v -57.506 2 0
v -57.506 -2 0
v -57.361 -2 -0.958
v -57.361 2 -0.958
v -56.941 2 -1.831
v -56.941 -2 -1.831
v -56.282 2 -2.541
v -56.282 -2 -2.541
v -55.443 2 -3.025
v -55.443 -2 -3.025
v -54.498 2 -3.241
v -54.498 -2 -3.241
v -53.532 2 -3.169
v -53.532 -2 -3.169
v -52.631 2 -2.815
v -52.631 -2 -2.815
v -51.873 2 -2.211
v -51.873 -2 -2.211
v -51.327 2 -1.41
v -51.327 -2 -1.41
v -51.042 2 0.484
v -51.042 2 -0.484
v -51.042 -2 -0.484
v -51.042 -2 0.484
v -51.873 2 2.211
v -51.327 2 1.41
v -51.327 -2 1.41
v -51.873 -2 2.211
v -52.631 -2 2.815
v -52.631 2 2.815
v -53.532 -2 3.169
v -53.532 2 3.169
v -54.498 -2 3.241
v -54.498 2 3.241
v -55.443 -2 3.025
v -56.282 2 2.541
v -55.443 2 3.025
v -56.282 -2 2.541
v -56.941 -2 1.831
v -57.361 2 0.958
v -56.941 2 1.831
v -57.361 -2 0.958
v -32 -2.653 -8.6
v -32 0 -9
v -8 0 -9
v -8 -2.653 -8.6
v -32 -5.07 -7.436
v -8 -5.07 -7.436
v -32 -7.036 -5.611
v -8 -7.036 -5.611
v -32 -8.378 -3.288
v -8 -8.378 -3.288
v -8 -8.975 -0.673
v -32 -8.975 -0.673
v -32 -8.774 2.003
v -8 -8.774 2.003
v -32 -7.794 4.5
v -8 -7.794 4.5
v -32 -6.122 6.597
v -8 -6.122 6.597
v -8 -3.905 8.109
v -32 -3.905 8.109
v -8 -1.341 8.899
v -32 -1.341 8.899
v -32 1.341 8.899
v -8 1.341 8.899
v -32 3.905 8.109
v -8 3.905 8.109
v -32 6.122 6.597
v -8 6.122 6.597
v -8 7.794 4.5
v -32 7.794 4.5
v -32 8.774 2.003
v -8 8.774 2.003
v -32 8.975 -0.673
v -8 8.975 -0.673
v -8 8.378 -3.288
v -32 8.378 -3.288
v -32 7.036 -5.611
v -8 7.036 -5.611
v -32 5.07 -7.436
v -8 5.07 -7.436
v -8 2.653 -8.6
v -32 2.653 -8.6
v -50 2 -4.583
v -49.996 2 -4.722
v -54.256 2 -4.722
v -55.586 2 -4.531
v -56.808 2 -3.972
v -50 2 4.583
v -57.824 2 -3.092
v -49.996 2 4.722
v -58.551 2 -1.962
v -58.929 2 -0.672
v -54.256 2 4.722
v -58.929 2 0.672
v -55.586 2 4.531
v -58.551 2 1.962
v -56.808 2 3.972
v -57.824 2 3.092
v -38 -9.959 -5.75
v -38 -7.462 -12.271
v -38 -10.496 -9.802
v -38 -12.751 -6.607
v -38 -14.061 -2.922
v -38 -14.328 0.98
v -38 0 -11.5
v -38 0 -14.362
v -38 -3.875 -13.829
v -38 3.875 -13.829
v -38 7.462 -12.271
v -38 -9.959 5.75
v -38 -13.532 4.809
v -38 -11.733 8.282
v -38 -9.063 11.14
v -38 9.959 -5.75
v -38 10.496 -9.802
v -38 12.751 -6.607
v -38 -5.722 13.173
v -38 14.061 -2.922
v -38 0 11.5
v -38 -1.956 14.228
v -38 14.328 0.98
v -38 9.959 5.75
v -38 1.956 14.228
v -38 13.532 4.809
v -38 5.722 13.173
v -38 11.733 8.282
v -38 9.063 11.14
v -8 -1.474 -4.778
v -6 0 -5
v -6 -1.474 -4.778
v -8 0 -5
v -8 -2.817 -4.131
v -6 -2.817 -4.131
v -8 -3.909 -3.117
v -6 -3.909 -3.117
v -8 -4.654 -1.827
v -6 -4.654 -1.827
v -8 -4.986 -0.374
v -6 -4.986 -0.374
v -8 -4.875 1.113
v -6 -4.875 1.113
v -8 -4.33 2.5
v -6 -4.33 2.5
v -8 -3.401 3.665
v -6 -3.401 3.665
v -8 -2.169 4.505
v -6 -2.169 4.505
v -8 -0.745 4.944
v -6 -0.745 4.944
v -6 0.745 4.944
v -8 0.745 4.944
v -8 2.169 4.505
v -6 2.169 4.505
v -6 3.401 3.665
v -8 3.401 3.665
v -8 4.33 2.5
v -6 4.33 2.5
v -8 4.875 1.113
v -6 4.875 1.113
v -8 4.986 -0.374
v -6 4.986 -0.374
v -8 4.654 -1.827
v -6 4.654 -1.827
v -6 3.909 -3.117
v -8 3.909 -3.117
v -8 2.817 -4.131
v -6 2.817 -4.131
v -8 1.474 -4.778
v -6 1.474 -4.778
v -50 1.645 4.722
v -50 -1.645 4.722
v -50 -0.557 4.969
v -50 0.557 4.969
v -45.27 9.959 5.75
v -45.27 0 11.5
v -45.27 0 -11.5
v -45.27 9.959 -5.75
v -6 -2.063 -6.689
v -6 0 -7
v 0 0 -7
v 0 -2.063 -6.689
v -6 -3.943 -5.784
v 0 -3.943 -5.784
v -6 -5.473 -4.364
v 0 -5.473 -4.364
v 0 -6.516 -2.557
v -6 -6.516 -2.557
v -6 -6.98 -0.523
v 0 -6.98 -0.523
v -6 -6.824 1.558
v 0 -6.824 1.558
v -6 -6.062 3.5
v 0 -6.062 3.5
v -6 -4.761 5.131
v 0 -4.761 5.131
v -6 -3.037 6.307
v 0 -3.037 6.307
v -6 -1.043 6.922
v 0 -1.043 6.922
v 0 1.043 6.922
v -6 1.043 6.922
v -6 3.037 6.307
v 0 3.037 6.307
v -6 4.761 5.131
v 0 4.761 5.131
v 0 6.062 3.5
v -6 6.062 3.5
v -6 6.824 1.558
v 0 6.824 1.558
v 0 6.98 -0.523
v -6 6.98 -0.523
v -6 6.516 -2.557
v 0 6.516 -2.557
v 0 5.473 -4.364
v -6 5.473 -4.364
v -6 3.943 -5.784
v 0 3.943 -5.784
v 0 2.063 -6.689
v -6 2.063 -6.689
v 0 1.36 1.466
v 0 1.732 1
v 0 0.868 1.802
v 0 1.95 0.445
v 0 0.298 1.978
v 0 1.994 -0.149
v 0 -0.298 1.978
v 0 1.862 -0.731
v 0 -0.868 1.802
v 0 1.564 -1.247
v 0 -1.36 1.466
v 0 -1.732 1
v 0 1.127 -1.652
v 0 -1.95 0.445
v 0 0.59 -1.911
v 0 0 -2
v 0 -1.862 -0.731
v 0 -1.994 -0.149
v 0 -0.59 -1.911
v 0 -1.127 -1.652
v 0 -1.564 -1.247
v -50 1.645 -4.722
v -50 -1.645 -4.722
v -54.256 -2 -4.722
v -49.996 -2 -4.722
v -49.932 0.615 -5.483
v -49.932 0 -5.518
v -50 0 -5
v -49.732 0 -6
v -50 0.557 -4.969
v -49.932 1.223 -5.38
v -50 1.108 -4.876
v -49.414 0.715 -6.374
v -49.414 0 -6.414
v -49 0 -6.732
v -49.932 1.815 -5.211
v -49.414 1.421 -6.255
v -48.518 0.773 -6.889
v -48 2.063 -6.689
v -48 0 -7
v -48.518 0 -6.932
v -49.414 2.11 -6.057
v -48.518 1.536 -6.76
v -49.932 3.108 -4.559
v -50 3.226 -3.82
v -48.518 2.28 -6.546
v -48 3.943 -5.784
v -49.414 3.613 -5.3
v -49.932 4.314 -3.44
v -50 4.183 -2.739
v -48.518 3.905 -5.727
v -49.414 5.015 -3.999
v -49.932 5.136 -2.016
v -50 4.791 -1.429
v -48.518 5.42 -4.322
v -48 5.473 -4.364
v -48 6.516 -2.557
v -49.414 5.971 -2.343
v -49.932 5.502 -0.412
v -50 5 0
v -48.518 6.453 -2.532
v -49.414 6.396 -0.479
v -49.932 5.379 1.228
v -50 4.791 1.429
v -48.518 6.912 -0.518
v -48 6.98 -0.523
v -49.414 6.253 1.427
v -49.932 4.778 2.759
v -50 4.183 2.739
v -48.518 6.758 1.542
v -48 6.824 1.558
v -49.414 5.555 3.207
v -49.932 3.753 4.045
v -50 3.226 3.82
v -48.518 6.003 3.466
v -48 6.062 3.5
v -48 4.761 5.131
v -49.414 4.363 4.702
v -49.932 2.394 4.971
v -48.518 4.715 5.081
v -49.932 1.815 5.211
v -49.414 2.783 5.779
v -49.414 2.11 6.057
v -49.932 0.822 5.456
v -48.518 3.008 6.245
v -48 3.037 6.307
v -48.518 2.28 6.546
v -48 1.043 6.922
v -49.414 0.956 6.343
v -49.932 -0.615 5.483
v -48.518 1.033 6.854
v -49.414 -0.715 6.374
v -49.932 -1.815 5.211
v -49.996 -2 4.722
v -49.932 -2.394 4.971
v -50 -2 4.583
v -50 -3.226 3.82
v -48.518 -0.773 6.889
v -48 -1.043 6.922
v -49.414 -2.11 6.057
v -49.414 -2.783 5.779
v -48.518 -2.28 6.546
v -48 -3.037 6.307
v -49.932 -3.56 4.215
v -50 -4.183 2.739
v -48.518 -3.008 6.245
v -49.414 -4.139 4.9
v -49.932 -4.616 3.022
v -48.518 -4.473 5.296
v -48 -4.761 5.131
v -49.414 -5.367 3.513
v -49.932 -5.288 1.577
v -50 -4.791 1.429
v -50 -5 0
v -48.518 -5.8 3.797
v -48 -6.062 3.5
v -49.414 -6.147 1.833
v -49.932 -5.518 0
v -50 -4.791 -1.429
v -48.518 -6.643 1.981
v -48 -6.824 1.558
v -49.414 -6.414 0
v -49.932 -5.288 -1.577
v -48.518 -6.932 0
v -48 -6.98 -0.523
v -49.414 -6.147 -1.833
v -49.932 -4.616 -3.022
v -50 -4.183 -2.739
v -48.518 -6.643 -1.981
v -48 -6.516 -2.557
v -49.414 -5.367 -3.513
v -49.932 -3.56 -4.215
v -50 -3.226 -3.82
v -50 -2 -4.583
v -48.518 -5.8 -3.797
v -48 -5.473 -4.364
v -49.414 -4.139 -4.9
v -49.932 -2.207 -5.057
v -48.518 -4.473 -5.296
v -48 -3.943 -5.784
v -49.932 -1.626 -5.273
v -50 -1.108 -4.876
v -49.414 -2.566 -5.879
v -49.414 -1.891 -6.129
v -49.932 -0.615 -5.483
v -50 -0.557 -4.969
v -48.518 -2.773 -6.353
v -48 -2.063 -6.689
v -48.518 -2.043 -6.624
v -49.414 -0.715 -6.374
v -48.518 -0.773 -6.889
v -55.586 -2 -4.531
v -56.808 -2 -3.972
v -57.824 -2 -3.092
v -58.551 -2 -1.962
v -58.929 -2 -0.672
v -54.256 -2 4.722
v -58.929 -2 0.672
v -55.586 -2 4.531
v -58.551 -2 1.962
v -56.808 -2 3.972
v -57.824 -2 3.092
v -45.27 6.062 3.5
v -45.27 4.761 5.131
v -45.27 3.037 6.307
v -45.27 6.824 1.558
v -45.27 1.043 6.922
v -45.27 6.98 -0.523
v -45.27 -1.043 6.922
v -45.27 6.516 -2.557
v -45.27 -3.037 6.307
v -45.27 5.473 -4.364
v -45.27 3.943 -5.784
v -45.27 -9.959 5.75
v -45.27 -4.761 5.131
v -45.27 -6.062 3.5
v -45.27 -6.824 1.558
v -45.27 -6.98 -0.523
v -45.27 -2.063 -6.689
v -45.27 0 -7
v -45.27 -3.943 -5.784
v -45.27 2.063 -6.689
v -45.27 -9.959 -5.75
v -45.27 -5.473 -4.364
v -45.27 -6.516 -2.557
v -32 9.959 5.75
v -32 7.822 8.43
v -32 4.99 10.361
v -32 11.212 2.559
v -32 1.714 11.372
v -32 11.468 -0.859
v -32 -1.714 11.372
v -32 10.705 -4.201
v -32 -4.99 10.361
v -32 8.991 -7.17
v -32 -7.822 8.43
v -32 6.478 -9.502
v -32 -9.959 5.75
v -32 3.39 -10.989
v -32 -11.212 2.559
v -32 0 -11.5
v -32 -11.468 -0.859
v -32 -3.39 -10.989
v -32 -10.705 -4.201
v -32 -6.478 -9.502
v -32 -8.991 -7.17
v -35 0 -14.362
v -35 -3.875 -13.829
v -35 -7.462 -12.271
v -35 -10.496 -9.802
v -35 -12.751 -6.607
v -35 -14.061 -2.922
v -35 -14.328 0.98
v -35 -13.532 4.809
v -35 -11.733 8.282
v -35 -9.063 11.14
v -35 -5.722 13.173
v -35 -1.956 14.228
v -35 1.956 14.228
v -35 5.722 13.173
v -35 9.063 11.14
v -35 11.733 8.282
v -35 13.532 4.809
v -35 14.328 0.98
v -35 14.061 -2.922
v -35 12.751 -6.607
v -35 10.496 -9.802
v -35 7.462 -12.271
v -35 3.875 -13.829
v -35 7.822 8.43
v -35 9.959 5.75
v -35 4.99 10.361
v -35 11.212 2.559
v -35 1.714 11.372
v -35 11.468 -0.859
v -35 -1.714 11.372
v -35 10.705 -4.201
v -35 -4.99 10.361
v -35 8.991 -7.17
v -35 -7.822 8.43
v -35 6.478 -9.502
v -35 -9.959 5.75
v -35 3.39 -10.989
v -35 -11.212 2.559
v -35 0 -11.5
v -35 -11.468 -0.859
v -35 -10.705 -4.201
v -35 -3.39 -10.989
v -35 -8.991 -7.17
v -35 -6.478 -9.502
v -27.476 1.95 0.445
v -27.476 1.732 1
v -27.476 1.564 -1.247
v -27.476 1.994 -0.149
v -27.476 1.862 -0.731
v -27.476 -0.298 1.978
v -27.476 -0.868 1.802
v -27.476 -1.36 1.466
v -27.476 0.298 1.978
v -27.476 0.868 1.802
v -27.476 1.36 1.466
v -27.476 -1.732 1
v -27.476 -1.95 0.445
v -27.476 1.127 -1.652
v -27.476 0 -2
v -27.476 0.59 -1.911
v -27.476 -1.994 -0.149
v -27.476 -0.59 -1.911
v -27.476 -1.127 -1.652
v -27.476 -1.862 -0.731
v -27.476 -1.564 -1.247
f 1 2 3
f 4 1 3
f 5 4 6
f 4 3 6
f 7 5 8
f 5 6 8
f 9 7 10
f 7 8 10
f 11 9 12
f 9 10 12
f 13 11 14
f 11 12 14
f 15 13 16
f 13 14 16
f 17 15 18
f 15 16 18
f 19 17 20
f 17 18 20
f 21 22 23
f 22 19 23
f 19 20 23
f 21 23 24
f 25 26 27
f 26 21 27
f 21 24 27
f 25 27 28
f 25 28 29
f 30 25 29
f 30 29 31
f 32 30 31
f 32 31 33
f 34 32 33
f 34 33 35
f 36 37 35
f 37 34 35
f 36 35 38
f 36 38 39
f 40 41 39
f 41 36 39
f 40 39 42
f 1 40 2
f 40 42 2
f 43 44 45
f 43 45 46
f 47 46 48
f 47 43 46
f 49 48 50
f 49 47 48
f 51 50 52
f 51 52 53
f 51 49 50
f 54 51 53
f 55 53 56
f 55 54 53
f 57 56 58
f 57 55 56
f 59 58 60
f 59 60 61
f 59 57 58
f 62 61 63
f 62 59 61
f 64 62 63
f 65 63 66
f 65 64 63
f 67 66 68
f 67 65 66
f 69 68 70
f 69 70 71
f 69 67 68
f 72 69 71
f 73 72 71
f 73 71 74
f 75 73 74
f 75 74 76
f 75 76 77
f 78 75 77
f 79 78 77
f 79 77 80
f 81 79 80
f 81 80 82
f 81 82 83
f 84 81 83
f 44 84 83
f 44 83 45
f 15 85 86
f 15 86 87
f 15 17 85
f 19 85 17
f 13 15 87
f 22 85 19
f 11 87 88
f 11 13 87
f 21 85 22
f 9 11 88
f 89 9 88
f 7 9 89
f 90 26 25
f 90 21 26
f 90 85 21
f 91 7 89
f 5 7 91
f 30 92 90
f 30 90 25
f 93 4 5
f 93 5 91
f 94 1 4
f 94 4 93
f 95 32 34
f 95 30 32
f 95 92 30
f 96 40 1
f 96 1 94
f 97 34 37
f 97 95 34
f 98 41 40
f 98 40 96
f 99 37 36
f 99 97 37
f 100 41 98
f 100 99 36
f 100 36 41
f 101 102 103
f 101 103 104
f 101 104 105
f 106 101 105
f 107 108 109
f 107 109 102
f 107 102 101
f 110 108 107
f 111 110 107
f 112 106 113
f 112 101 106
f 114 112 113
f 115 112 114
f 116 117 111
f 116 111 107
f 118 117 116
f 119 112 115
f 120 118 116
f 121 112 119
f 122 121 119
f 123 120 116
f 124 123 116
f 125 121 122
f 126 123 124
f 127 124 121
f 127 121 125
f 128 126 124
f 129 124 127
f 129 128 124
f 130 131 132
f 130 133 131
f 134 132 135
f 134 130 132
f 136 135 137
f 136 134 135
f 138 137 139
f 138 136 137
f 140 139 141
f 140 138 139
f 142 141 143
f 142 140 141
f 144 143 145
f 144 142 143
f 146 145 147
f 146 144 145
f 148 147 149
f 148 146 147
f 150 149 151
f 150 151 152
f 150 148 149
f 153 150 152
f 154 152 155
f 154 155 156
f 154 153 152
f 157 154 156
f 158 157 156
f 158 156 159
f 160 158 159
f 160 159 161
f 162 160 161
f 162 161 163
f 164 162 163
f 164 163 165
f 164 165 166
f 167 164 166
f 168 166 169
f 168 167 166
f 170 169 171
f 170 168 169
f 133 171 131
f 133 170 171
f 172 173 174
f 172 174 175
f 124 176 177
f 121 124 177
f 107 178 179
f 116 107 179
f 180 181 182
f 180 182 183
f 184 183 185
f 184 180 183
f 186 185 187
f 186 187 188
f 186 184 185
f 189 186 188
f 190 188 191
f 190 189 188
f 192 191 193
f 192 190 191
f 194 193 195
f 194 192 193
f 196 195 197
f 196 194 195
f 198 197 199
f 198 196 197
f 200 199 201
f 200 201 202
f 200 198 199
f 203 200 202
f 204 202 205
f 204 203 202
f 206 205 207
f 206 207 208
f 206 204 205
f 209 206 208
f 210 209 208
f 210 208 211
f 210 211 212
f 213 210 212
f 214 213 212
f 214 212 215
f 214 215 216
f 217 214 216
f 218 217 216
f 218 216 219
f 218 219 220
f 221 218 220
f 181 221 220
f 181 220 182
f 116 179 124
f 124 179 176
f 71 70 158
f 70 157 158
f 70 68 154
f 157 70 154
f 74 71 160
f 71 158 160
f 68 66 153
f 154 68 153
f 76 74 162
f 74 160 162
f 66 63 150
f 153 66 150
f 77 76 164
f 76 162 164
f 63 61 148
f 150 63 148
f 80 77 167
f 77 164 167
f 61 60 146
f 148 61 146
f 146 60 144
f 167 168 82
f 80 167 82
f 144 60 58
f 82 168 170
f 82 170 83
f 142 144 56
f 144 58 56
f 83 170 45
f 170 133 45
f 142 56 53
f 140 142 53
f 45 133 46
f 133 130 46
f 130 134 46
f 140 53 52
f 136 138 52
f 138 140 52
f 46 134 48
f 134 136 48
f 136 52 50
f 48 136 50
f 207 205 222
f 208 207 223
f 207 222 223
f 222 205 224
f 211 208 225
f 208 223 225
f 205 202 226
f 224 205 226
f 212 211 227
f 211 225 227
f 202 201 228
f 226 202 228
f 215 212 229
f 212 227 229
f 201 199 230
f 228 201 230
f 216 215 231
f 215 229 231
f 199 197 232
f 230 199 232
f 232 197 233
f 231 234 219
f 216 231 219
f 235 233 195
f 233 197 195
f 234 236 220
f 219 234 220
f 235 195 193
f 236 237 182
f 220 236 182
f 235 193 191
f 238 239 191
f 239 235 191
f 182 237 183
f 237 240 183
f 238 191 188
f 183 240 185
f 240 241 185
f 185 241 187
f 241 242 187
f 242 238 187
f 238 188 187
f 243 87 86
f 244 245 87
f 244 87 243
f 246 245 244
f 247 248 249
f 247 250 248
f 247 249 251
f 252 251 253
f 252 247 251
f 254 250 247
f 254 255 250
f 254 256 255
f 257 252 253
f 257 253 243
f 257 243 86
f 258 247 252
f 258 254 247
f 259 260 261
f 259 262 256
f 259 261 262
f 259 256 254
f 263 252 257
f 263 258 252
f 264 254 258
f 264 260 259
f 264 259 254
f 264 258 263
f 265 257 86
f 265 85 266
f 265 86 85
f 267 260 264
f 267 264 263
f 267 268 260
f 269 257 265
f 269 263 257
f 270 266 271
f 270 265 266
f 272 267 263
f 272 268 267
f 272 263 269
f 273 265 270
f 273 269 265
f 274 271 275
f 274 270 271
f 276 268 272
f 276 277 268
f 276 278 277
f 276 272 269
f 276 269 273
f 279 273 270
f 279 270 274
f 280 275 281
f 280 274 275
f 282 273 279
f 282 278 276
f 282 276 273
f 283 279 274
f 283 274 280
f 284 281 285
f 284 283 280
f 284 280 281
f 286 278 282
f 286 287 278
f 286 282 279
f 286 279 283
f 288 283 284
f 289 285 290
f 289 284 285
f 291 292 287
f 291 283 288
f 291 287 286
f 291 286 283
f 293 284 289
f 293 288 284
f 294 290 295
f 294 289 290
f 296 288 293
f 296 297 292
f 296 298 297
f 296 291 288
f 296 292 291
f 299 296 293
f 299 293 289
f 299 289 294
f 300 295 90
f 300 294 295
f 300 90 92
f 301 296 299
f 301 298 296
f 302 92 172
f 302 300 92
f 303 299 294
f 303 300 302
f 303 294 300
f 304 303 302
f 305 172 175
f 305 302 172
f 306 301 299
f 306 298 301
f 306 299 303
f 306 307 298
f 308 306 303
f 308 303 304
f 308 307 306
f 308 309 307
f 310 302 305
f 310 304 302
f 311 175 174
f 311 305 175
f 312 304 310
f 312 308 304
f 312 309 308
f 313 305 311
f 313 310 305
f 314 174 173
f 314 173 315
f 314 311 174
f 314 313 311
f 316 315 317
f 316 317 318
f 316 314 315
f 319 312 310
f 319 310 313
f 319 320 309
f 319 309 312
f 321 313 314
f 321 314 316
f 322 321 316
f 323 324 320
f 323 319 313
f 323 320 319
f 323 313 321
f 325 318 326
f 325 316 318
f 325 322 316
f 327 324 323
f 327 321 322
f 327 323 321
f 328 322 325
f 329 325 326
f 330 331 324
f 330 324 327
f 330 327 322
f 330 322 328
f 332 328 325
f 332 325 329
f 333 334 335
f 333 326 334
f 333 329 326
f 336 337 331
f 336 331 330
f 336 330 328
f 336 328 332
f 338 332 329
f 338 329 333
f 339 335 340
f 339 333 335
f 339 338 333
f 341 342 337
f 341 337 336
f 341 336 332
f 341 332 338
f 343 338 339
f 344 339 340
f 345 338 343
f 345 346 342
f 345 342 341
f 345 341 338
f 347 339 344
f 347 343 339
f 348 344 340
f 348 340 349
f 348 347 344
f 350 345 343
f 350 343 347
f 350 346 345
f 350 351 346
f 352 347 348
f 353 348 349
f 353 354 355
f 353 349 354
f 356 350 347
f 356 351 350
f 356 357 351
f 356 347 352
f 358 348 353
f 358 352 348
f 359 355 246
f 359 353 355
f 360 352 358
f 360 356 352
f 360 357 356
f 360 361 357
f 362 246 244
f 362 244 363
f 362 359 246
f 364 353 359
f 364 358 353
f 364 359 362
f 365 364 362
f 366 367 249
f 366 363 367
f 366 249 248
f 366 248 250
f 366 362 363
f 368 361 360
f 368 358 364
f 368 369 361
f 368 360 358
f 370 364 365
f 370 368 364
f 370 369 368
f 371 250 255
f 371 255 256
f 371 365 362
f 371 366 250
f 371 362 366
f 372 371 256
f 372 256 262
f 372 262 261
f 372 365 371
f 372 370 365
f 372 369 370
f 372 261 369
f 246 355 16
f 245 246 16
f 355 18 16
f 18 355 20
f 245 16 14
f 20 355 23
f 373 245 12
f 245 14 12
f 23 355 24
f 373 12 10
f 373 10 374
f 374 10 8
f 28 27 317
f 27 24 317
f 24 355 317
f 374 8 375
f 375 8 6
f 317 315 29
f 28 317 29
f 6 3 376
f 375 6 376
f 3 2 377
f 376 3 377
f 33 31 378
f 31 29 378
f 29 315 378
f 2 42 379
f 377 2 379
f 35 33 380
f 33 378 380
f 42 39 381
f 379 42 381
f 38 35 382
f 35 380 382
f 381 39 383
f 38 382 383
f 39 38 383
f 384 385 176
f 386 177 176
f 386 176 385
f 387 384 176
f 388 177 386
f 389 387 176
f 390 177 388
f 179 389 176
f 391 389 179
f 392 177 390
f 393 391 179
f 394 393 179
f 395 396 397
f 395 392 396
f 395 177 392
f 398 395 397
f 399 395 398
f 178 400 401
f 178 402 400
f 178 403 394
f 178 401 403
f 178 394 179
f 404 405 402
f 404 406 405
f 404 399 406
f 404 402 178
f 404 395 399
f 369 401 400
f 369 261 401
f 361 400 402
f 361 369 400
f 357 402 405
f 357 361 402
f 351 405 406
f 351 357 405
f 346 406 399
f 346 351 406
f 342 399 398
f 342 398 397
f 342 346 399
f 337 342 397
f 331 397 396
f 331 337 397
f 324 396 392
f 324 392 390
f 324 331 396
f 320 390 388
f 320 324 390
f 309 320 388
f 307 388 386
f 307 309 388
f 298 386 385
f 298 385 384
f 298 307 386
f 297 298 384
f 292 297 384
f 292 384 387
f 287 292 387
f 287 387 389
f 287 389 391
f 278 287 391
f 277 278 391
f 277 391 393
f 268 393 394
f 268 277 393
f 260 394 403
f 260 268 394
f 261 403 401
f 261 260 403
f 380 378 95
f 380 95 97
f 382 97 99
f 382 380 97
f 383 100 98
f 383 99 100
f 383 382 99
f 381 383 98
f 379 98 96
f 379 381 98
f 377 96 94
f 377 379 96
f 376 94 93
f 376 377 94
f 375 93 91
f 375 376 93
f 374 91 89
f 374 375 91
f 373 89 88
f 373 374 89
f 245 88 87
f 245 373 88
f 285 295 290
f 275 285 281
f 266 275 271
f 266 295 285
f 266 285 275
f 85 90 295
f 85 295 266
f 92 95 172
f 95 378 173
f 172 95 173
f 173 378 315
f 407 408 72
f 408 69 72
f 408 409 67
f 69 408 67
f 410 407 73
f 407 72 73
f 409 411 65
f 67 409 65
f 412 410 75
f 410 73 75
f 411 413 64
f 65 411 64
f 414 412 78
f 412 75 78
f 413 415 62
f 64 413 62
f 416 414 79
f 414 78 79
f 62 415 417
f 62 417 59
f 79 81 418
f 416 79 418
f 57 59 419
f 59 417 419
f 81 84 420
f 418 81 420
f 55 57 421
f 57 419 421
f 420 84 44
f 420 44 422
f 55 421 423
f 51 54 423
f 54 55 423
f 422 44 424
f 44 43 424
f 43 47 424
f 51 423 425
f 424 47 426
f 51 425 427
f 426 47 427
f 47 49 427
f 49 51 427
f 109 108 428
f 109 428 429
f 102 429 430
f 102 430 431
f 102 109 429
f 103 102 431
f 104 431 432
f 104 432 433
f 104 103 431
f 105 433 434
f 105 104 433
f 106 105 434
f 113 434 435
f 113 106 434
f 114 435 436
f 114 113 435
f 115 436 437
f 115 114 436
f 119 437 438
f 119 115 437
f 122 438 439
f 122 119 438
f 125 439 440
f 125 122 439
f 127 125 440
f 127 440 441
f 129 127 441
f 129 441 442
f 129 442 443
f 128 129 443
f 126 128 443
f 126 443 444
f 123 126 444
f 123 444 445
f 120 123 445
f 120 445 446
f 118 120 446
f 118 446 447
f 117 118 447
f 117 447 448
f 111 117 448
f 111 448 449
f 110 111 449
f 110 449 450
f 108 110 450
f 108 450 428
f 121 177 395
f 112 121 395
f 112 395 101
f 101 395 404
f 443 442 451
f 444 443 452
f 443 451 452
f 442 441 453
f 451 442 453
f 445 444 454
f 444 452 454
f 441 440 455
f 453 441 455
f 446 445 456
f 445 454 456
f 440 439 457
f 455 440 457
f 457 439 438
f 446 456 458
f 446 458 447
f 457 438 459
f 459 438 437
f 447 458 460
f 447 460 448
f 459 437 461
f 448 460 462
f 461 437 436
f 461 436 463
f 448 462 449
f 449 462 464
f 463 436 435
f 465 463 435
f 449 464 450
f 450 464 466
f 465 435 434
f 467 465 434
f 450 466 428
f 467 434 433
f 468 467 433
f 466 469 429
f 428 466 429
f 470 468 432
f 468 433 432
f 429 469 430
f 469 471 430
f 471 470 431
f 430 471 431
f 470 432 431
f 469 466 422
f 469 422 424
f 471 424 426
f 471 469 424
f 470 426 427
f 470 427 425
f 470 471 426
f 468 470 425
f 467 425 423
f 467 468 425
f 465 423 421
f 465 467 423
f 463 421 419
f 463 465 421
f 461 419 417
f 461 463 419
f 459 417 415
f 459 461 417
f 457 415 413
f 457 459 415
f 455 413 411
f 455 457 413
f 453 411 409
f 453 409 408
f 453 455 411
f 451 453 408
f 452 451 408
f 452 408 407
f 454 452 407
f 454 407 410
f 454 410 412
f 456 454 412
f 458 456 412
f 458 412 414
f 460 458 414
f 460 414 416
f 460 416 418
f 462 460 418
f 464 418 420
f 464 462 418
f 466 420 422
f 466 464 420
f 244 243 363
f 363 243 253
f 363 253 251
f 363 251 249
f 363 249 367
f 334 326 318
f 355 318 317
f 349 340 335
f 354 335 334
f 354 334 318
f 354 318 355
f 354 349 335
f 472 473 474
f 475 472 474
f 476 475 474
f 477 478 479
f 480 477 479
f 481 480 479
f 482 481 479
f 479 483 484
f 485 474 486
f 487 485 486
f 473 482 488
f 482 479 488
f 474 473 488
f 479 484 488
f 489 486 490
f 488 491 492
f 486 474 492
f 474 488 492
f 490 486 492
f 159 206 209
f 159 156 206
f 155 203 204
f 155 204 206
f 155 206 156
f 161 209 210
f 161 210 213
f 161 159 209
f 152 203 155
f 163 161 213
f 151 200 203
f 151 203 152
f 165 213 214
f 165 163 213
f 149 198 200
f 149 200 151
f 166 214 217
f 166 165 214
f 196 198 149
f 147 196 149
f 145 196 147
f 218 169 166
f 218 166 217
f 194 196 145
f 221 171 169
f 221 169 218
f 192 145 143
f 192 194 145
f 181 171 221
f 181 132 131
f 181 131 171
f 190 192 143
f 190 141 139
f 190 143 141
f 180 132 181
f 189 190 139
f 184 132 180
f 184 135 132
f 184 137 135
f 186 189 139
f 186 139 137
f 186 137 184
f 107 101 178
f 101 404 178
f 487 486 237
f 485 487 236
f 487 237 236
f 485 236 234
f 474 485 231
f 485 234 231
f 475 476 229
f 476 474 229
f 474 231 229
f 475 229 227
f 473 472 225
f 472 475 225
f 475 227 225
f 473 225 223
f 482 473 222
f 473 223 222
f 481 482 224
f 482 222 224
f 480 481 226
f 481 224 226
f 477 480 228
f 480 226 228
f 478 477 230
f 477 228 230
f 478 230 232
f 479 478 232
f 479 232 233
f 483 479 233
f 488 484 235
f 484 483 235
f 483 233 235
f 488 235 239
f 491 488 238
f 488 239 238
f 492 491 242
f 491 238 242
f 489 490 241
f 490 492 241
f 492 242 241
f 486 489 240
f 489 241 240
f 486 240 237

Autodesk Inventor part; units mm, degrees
ref_plane "YZ Plane" through (0, 0, 0) normal (1, 0, 0) x (0, 1, 0)
ref_plane "XZ Plane" through (0, 0, 0) normal (0, 1, 0) x (-1, 0, 0)
ref_plane "XY Plane" through (0, 0, 0) normal (0, 0, 1) x (1, 0, 0)
sketch "Sketch1" plane through (0, 0, 0) normal (0, 1, 0) x (-1, 0, 0)
  line L0 (0, 0) -> (50, 0)
  line L1 (0, 0) -> (0, -7)
  line L2 (0, -7) -> (6, -7)
  line L3 (6, -7) -> (6, -5)
  line L4 (6, -5) -> (8, -5)
  line L5 (8, -5) -> (8, -9)
  line L6 (8, -9) -> (32, -9)
  line L7 (32, -9) -> (32, -11.5)
  line L8 (32, -11.5) -> (35, -11.5)
  line L9 (35, -11.5) -> (35, -14.3615)
  line L10 (35, -14.3615) -> (38, -14.3615)
  line L11 (38, -14.3615) -> (38, -11.5)
  line L12 (38, -11.5) -> (45.2698, -11.5)
  line L13 (45.2698, -11.5) -> (45.2698, -7)
  line L14 (45.2698, -7) -> (50, -7)
  line L15 (50, -7) -> (50, 0)
  line L16 (0, 0) -> (27.4762, 0)
  line L17 (27.4762, 0) -> (27.4762, -2)
  line L18 (27.4762, -2) -> (0, -2)
  line L19 (0, -2) -> (0, 0)
  point P0 (7, -5)
  point P1 (32, -10.25)
  dimension "d0" = 50
  dimension "d1" = 7
  dimension "d2" = 6
  dimension "d3" = 2
  dimension "d4" = 5
  dimension "d6" = 24
  dimension "d7" = 3
  dimension "d8" = 3
  dimension "d9" = 11.5
  dimension "d10" = 9
  dimension "d12" = 2
revolve "Revolution1" add sketch "Sketch1" angle 360 about axis through (0, 0, 0) along (-1, 0, 0) contours L0 L15 L14 L13 L12 L11 L10 L9 L8 L7 L6 L5 L4 L3 L2 L1 L18 L17
sketch "Sketch2" plane through (0, 0, 0) normal (0, 1, 0) x (-1, 0, 0)
  line L0 (50, -7) -> (50, 7) projected
  line L1 (45.2698, -7) -> (45.2698, 7) projected
  circle A0 centre (54.2556, 0) radius 3.25
  arc A1 (54.2556, -4.7218) -> (54.2556, 4.7218) centre (54.2556, 0) ccw
  line L2 (54.2556, 4.7218) -> (50, 4.7218)
  line L3 (54.2556, -4.7218) -> (50, -4.7218)
  point P0 (0, 0)
  dimension "d13" = 6.5
extrude "Extrusion1" add sketch "Sketch2" along normal mid plane 4
fillet "Fillet1" radius 2 1 edges at (-50, 0, 7)
sketch "Sketch3" plane through (-45.2698, 0, 0) normal (-1, 0, 0) x (0, 0, 1)
  circle A0 centre (0, 0) radius 11.5 projected
  circle A1 centre (0, 0) radius 2 projected
  line L0 (11.5, 0) -> (5.75, -9.9593)
  line L1 (5.75, -9.9593) -> (-5.75, -9.9593)
  line L2 (-5.75, -9.9593) -> (-11.5, 0)
  line L3 (-11.5, 0) -> (-5.75, 9.9593)
  line L4 (-5.75, 9.9593) -> (5.75, 9.9593)
  line L5 (5.75, 9.9593) -> (11.5, 0)
  point P0 (-11.5, 0)
  point P1 (-11.5, 0)
  point P2 (-5.75, -9.9593)
  point P3 (-5.75, -9.9593)
extrude "Extrusion2" cut sketch "Sketch3" against normal up to surface (7.2698 mm away) contours L5 A0 | A0 L0 | L4 A0 | A0 L1 | L3 A0 | A0 L2
thread "Thread1" size "5-40 UNC" class "2A" standard "ANSI Unified Screw Threads" full length
properties part number "100MMshockUpper"
